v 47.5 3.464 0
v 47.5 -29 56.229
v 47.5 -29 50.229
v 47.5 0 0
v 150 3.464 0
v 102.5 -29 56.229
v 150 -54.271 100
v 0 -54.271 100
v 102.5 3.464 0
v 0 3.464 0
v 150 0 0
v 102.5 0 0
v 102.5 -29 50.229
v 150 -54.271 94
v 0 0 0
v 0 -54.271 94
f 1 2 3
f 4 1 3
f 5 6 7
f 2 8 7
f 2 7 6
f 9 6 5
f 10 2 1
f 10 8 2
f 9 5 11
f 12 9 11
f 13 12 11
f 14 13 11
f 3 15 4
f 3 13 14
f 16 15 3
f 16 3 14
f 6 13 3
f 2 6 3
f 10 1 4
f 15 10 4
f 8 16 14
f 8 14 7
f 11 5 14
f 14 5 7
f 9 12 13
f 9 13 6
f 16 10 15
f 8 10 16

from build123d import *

# Parameters (mm, degrees)
BOSS_EXTRUDE1_DEPTH = 150
CUT_EXTRUDE1_DEPTH  = 101


with BuildPart() as part:
    # Sketch1 → Boss-Extrude1 (new body)
    with BuildSketch(Plane(origin=(0, 0, 0), x_dir=(0, 0, -1), z_dir=(1, 0, 0))):
        Polygon((0, 0), (-94, -54.270925304), (-100, -54.270925304), (0, 3.464101615), align=None)
    extrude(amount=BOSS_EXTRUDE1_DEPTH)

    # Sketch2 → Cut-Extrude1 (cut, through all)
    with BuildSketch(Plane.XY):
        Polygon((102.5, 0), (102.5, -29), (47.5, -29), (47.5, 0), (47.5, 3.464101615), (102.5, 3.464101615), align=None)
    extrude(amount=CUT_EXTRUDE1_DEPTH, mode=Mode.SUBTRACT)


solid = part.part
